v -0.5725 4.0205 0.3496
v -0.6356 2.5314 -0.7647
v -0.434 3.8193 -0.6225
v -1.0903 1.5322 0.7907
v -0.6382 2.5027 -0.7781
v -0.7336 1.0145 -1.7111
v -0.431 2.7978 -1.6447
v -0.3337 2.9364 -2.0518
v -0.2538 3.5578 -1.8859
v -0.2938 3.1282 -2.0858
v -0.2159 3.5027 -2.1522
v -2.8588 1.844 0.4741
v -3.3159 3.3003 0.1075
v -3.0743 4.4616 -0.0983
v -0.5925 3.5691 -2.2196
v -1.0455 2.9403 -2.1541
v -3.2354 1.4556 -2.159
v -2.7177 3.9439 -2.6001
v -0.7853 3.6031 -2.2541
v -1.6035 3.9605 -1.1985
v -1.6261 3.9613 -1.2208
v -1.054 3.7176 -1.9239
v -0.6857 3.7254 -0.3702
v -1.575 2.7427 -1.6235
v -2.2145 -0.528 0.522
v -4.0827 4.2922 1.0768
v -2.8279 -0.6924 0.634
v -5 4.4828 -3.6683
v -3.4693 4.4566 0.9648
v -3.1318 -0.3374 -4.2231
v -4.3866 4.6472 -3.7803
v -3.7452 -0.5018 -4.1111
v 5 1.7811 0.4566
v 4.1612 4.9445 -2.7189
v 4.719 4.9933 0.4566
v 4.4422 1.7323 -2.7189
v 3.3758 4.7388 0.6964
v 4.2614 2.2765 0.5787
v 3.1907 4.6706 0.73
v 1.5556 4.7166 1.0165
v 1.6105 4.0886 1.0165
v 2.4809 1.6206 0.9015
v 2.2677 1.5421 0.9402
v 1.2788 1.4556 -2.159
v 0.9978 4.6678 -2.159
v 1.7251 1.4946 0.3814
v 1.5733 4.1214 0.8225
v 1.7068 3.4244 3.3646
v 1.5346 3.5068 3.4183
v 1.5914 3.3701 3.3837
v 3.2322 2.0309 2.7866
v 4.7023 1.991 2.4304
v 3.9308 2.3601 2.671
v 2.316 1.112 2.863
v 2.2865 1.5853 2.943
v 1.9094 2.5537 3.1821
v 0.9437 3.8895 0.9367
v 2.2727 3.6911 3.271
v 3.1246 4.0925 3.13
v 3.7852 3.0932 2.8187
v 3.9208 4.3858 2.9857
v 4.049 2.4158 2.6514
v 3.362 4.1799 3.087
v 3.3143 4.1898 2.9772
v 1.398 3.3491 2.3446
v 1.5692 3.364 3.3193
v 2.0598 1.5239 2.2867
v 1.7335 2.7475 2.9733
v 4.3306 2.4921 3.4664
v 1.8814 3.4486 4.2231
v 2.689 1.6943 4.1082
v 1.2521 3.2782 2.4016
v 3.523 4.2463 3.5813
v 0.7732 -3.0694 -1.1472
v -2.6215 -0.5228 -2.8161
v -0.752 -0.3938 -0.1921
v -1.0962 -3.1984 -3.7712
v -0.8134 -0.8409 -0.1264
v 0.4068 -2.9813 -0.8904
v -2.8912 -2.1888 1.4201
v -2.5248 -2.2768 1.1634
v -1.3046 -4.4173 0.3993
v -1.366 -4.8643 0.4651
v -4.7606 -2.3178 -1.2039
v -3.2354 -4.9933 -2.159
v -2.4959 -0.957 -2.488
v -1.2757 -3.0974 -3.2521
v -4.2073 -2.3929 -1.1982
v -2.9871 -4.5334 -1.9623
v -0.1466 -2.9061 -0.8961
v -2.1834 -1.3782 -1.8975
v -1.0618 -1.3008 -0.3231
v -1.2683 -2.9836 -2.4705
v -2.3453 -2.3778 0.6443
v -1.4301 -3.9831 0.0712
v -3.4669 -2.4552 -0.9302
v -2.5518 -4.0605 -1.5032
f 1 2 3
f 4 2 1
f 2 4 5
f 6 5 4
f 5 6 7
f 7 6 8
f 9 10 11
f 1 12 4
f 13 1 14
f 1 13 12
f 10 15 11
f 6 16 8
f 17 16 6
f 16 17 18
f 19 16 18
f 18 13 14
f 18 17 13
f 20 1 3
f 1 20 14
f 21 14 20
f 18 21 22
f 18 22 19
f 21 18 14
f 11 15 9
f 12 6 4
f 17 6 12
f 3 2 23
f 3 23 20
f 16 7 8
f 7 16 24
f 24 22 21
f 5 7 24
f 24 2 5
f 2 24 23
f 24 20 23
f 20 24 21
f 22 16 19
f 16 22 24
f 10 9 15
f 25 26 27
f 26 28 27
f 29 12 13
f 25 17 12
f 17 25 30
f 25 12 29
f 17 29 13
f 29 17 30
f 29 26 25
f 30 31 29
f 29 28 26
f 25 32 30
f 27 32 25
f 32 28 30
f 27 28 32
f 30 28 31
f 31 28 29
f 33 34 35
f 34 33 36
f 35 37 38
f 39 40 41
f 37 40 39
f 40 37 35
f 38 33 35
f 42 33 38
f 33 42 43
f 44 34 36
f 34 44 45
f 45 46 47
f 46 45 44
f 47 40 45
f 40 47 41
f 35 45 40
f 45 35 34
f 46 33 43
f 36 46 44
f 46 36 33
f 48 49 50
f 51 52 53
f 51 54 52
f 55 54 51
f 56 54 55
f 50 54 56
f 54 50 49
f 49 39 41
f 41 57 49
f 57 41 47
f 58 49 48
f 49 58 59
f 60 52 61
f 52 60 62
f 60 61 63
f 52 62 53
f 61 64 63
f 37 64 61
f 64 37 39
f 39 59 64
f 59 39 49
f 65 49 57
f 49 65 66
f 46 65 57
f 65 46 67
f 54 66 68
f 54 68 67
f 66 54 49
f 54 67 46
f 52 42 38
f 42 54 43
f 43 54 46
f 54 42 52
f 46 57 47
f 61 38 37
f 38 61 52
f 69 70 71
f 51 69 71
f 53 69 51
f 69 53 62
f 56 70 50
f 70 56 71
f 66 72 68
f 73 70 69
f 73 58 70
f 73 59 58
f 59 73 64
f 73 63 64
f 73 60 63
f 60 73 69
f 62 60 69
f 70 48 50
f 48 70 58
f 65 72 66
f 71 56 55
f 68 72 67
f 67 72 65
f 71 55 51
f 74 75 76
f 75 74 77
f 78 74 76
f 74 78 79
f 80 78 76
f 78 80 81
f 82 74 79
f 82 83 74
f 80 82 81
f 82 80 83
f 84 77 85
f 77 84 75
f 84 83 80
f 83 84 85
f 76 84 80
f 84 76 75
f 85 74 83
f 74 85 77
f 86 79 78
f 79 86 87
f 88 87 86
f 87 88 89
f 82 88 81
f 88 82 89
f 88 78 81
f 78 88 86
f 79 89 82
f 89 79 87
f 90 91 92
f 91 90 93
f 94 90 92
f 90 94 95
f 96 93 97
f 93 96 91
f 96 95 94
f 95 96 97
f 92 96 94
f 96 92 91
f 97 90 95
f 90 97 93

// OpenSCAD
translate([-3.235401, 1.455586, -2.158996])
union() {
  union() {
    rotate([5, 10, 15])
    translate([-0.644892, -1.934676, -1.934676])
    cube(size = [0.644892, 5.159137, 4.836691], center = false);
    rotate([-10, -10, -10])
    difference() {
      cube(size = [2.579568, 2.579568, 2.579568], center = false);
      translate([1.483252, 1.483252, 0.548158])
      rotate([45, 45, 45])
      cube(size = [1.289784, 1.289784, 1.289784], center = false);
    }
  }
  translate([4.514245, 0.000000, 0.000000])
  rotate([0, 10, 5])
  union() {
    cube(size = [3.224460, 3.224460, 3.224460], center = false);
    translate([0.000000, 0.000000, 2.579568])
    rotate([10, 0, 15])
    cube(size = [2.579568, 2.579568, 2.579568], center = false);
    translate([0.000000, 0.000000, 4.514245])
    rotate([0, 10, 20])
    cube(size = [1.934676, 1.934676, 1.934676], center = false);
  }
  translate([0.000000, -6.448921, 0.000000])
  rotate([20, 30, 40])
  union() {
    translate([0.644892, 0.644892, 0.967338])
    cube(size = [1.934676, 1.934676, 1.934676], center = false);
    difference() {
      cube(size = [3.224460, 3.224460, 3.224460], center = false);
      translate([0.322446, 0.322446, 0.322446])
      cube(size = [2.579568, 2.579568, 3.869353], center = false);
    }
  }
}
